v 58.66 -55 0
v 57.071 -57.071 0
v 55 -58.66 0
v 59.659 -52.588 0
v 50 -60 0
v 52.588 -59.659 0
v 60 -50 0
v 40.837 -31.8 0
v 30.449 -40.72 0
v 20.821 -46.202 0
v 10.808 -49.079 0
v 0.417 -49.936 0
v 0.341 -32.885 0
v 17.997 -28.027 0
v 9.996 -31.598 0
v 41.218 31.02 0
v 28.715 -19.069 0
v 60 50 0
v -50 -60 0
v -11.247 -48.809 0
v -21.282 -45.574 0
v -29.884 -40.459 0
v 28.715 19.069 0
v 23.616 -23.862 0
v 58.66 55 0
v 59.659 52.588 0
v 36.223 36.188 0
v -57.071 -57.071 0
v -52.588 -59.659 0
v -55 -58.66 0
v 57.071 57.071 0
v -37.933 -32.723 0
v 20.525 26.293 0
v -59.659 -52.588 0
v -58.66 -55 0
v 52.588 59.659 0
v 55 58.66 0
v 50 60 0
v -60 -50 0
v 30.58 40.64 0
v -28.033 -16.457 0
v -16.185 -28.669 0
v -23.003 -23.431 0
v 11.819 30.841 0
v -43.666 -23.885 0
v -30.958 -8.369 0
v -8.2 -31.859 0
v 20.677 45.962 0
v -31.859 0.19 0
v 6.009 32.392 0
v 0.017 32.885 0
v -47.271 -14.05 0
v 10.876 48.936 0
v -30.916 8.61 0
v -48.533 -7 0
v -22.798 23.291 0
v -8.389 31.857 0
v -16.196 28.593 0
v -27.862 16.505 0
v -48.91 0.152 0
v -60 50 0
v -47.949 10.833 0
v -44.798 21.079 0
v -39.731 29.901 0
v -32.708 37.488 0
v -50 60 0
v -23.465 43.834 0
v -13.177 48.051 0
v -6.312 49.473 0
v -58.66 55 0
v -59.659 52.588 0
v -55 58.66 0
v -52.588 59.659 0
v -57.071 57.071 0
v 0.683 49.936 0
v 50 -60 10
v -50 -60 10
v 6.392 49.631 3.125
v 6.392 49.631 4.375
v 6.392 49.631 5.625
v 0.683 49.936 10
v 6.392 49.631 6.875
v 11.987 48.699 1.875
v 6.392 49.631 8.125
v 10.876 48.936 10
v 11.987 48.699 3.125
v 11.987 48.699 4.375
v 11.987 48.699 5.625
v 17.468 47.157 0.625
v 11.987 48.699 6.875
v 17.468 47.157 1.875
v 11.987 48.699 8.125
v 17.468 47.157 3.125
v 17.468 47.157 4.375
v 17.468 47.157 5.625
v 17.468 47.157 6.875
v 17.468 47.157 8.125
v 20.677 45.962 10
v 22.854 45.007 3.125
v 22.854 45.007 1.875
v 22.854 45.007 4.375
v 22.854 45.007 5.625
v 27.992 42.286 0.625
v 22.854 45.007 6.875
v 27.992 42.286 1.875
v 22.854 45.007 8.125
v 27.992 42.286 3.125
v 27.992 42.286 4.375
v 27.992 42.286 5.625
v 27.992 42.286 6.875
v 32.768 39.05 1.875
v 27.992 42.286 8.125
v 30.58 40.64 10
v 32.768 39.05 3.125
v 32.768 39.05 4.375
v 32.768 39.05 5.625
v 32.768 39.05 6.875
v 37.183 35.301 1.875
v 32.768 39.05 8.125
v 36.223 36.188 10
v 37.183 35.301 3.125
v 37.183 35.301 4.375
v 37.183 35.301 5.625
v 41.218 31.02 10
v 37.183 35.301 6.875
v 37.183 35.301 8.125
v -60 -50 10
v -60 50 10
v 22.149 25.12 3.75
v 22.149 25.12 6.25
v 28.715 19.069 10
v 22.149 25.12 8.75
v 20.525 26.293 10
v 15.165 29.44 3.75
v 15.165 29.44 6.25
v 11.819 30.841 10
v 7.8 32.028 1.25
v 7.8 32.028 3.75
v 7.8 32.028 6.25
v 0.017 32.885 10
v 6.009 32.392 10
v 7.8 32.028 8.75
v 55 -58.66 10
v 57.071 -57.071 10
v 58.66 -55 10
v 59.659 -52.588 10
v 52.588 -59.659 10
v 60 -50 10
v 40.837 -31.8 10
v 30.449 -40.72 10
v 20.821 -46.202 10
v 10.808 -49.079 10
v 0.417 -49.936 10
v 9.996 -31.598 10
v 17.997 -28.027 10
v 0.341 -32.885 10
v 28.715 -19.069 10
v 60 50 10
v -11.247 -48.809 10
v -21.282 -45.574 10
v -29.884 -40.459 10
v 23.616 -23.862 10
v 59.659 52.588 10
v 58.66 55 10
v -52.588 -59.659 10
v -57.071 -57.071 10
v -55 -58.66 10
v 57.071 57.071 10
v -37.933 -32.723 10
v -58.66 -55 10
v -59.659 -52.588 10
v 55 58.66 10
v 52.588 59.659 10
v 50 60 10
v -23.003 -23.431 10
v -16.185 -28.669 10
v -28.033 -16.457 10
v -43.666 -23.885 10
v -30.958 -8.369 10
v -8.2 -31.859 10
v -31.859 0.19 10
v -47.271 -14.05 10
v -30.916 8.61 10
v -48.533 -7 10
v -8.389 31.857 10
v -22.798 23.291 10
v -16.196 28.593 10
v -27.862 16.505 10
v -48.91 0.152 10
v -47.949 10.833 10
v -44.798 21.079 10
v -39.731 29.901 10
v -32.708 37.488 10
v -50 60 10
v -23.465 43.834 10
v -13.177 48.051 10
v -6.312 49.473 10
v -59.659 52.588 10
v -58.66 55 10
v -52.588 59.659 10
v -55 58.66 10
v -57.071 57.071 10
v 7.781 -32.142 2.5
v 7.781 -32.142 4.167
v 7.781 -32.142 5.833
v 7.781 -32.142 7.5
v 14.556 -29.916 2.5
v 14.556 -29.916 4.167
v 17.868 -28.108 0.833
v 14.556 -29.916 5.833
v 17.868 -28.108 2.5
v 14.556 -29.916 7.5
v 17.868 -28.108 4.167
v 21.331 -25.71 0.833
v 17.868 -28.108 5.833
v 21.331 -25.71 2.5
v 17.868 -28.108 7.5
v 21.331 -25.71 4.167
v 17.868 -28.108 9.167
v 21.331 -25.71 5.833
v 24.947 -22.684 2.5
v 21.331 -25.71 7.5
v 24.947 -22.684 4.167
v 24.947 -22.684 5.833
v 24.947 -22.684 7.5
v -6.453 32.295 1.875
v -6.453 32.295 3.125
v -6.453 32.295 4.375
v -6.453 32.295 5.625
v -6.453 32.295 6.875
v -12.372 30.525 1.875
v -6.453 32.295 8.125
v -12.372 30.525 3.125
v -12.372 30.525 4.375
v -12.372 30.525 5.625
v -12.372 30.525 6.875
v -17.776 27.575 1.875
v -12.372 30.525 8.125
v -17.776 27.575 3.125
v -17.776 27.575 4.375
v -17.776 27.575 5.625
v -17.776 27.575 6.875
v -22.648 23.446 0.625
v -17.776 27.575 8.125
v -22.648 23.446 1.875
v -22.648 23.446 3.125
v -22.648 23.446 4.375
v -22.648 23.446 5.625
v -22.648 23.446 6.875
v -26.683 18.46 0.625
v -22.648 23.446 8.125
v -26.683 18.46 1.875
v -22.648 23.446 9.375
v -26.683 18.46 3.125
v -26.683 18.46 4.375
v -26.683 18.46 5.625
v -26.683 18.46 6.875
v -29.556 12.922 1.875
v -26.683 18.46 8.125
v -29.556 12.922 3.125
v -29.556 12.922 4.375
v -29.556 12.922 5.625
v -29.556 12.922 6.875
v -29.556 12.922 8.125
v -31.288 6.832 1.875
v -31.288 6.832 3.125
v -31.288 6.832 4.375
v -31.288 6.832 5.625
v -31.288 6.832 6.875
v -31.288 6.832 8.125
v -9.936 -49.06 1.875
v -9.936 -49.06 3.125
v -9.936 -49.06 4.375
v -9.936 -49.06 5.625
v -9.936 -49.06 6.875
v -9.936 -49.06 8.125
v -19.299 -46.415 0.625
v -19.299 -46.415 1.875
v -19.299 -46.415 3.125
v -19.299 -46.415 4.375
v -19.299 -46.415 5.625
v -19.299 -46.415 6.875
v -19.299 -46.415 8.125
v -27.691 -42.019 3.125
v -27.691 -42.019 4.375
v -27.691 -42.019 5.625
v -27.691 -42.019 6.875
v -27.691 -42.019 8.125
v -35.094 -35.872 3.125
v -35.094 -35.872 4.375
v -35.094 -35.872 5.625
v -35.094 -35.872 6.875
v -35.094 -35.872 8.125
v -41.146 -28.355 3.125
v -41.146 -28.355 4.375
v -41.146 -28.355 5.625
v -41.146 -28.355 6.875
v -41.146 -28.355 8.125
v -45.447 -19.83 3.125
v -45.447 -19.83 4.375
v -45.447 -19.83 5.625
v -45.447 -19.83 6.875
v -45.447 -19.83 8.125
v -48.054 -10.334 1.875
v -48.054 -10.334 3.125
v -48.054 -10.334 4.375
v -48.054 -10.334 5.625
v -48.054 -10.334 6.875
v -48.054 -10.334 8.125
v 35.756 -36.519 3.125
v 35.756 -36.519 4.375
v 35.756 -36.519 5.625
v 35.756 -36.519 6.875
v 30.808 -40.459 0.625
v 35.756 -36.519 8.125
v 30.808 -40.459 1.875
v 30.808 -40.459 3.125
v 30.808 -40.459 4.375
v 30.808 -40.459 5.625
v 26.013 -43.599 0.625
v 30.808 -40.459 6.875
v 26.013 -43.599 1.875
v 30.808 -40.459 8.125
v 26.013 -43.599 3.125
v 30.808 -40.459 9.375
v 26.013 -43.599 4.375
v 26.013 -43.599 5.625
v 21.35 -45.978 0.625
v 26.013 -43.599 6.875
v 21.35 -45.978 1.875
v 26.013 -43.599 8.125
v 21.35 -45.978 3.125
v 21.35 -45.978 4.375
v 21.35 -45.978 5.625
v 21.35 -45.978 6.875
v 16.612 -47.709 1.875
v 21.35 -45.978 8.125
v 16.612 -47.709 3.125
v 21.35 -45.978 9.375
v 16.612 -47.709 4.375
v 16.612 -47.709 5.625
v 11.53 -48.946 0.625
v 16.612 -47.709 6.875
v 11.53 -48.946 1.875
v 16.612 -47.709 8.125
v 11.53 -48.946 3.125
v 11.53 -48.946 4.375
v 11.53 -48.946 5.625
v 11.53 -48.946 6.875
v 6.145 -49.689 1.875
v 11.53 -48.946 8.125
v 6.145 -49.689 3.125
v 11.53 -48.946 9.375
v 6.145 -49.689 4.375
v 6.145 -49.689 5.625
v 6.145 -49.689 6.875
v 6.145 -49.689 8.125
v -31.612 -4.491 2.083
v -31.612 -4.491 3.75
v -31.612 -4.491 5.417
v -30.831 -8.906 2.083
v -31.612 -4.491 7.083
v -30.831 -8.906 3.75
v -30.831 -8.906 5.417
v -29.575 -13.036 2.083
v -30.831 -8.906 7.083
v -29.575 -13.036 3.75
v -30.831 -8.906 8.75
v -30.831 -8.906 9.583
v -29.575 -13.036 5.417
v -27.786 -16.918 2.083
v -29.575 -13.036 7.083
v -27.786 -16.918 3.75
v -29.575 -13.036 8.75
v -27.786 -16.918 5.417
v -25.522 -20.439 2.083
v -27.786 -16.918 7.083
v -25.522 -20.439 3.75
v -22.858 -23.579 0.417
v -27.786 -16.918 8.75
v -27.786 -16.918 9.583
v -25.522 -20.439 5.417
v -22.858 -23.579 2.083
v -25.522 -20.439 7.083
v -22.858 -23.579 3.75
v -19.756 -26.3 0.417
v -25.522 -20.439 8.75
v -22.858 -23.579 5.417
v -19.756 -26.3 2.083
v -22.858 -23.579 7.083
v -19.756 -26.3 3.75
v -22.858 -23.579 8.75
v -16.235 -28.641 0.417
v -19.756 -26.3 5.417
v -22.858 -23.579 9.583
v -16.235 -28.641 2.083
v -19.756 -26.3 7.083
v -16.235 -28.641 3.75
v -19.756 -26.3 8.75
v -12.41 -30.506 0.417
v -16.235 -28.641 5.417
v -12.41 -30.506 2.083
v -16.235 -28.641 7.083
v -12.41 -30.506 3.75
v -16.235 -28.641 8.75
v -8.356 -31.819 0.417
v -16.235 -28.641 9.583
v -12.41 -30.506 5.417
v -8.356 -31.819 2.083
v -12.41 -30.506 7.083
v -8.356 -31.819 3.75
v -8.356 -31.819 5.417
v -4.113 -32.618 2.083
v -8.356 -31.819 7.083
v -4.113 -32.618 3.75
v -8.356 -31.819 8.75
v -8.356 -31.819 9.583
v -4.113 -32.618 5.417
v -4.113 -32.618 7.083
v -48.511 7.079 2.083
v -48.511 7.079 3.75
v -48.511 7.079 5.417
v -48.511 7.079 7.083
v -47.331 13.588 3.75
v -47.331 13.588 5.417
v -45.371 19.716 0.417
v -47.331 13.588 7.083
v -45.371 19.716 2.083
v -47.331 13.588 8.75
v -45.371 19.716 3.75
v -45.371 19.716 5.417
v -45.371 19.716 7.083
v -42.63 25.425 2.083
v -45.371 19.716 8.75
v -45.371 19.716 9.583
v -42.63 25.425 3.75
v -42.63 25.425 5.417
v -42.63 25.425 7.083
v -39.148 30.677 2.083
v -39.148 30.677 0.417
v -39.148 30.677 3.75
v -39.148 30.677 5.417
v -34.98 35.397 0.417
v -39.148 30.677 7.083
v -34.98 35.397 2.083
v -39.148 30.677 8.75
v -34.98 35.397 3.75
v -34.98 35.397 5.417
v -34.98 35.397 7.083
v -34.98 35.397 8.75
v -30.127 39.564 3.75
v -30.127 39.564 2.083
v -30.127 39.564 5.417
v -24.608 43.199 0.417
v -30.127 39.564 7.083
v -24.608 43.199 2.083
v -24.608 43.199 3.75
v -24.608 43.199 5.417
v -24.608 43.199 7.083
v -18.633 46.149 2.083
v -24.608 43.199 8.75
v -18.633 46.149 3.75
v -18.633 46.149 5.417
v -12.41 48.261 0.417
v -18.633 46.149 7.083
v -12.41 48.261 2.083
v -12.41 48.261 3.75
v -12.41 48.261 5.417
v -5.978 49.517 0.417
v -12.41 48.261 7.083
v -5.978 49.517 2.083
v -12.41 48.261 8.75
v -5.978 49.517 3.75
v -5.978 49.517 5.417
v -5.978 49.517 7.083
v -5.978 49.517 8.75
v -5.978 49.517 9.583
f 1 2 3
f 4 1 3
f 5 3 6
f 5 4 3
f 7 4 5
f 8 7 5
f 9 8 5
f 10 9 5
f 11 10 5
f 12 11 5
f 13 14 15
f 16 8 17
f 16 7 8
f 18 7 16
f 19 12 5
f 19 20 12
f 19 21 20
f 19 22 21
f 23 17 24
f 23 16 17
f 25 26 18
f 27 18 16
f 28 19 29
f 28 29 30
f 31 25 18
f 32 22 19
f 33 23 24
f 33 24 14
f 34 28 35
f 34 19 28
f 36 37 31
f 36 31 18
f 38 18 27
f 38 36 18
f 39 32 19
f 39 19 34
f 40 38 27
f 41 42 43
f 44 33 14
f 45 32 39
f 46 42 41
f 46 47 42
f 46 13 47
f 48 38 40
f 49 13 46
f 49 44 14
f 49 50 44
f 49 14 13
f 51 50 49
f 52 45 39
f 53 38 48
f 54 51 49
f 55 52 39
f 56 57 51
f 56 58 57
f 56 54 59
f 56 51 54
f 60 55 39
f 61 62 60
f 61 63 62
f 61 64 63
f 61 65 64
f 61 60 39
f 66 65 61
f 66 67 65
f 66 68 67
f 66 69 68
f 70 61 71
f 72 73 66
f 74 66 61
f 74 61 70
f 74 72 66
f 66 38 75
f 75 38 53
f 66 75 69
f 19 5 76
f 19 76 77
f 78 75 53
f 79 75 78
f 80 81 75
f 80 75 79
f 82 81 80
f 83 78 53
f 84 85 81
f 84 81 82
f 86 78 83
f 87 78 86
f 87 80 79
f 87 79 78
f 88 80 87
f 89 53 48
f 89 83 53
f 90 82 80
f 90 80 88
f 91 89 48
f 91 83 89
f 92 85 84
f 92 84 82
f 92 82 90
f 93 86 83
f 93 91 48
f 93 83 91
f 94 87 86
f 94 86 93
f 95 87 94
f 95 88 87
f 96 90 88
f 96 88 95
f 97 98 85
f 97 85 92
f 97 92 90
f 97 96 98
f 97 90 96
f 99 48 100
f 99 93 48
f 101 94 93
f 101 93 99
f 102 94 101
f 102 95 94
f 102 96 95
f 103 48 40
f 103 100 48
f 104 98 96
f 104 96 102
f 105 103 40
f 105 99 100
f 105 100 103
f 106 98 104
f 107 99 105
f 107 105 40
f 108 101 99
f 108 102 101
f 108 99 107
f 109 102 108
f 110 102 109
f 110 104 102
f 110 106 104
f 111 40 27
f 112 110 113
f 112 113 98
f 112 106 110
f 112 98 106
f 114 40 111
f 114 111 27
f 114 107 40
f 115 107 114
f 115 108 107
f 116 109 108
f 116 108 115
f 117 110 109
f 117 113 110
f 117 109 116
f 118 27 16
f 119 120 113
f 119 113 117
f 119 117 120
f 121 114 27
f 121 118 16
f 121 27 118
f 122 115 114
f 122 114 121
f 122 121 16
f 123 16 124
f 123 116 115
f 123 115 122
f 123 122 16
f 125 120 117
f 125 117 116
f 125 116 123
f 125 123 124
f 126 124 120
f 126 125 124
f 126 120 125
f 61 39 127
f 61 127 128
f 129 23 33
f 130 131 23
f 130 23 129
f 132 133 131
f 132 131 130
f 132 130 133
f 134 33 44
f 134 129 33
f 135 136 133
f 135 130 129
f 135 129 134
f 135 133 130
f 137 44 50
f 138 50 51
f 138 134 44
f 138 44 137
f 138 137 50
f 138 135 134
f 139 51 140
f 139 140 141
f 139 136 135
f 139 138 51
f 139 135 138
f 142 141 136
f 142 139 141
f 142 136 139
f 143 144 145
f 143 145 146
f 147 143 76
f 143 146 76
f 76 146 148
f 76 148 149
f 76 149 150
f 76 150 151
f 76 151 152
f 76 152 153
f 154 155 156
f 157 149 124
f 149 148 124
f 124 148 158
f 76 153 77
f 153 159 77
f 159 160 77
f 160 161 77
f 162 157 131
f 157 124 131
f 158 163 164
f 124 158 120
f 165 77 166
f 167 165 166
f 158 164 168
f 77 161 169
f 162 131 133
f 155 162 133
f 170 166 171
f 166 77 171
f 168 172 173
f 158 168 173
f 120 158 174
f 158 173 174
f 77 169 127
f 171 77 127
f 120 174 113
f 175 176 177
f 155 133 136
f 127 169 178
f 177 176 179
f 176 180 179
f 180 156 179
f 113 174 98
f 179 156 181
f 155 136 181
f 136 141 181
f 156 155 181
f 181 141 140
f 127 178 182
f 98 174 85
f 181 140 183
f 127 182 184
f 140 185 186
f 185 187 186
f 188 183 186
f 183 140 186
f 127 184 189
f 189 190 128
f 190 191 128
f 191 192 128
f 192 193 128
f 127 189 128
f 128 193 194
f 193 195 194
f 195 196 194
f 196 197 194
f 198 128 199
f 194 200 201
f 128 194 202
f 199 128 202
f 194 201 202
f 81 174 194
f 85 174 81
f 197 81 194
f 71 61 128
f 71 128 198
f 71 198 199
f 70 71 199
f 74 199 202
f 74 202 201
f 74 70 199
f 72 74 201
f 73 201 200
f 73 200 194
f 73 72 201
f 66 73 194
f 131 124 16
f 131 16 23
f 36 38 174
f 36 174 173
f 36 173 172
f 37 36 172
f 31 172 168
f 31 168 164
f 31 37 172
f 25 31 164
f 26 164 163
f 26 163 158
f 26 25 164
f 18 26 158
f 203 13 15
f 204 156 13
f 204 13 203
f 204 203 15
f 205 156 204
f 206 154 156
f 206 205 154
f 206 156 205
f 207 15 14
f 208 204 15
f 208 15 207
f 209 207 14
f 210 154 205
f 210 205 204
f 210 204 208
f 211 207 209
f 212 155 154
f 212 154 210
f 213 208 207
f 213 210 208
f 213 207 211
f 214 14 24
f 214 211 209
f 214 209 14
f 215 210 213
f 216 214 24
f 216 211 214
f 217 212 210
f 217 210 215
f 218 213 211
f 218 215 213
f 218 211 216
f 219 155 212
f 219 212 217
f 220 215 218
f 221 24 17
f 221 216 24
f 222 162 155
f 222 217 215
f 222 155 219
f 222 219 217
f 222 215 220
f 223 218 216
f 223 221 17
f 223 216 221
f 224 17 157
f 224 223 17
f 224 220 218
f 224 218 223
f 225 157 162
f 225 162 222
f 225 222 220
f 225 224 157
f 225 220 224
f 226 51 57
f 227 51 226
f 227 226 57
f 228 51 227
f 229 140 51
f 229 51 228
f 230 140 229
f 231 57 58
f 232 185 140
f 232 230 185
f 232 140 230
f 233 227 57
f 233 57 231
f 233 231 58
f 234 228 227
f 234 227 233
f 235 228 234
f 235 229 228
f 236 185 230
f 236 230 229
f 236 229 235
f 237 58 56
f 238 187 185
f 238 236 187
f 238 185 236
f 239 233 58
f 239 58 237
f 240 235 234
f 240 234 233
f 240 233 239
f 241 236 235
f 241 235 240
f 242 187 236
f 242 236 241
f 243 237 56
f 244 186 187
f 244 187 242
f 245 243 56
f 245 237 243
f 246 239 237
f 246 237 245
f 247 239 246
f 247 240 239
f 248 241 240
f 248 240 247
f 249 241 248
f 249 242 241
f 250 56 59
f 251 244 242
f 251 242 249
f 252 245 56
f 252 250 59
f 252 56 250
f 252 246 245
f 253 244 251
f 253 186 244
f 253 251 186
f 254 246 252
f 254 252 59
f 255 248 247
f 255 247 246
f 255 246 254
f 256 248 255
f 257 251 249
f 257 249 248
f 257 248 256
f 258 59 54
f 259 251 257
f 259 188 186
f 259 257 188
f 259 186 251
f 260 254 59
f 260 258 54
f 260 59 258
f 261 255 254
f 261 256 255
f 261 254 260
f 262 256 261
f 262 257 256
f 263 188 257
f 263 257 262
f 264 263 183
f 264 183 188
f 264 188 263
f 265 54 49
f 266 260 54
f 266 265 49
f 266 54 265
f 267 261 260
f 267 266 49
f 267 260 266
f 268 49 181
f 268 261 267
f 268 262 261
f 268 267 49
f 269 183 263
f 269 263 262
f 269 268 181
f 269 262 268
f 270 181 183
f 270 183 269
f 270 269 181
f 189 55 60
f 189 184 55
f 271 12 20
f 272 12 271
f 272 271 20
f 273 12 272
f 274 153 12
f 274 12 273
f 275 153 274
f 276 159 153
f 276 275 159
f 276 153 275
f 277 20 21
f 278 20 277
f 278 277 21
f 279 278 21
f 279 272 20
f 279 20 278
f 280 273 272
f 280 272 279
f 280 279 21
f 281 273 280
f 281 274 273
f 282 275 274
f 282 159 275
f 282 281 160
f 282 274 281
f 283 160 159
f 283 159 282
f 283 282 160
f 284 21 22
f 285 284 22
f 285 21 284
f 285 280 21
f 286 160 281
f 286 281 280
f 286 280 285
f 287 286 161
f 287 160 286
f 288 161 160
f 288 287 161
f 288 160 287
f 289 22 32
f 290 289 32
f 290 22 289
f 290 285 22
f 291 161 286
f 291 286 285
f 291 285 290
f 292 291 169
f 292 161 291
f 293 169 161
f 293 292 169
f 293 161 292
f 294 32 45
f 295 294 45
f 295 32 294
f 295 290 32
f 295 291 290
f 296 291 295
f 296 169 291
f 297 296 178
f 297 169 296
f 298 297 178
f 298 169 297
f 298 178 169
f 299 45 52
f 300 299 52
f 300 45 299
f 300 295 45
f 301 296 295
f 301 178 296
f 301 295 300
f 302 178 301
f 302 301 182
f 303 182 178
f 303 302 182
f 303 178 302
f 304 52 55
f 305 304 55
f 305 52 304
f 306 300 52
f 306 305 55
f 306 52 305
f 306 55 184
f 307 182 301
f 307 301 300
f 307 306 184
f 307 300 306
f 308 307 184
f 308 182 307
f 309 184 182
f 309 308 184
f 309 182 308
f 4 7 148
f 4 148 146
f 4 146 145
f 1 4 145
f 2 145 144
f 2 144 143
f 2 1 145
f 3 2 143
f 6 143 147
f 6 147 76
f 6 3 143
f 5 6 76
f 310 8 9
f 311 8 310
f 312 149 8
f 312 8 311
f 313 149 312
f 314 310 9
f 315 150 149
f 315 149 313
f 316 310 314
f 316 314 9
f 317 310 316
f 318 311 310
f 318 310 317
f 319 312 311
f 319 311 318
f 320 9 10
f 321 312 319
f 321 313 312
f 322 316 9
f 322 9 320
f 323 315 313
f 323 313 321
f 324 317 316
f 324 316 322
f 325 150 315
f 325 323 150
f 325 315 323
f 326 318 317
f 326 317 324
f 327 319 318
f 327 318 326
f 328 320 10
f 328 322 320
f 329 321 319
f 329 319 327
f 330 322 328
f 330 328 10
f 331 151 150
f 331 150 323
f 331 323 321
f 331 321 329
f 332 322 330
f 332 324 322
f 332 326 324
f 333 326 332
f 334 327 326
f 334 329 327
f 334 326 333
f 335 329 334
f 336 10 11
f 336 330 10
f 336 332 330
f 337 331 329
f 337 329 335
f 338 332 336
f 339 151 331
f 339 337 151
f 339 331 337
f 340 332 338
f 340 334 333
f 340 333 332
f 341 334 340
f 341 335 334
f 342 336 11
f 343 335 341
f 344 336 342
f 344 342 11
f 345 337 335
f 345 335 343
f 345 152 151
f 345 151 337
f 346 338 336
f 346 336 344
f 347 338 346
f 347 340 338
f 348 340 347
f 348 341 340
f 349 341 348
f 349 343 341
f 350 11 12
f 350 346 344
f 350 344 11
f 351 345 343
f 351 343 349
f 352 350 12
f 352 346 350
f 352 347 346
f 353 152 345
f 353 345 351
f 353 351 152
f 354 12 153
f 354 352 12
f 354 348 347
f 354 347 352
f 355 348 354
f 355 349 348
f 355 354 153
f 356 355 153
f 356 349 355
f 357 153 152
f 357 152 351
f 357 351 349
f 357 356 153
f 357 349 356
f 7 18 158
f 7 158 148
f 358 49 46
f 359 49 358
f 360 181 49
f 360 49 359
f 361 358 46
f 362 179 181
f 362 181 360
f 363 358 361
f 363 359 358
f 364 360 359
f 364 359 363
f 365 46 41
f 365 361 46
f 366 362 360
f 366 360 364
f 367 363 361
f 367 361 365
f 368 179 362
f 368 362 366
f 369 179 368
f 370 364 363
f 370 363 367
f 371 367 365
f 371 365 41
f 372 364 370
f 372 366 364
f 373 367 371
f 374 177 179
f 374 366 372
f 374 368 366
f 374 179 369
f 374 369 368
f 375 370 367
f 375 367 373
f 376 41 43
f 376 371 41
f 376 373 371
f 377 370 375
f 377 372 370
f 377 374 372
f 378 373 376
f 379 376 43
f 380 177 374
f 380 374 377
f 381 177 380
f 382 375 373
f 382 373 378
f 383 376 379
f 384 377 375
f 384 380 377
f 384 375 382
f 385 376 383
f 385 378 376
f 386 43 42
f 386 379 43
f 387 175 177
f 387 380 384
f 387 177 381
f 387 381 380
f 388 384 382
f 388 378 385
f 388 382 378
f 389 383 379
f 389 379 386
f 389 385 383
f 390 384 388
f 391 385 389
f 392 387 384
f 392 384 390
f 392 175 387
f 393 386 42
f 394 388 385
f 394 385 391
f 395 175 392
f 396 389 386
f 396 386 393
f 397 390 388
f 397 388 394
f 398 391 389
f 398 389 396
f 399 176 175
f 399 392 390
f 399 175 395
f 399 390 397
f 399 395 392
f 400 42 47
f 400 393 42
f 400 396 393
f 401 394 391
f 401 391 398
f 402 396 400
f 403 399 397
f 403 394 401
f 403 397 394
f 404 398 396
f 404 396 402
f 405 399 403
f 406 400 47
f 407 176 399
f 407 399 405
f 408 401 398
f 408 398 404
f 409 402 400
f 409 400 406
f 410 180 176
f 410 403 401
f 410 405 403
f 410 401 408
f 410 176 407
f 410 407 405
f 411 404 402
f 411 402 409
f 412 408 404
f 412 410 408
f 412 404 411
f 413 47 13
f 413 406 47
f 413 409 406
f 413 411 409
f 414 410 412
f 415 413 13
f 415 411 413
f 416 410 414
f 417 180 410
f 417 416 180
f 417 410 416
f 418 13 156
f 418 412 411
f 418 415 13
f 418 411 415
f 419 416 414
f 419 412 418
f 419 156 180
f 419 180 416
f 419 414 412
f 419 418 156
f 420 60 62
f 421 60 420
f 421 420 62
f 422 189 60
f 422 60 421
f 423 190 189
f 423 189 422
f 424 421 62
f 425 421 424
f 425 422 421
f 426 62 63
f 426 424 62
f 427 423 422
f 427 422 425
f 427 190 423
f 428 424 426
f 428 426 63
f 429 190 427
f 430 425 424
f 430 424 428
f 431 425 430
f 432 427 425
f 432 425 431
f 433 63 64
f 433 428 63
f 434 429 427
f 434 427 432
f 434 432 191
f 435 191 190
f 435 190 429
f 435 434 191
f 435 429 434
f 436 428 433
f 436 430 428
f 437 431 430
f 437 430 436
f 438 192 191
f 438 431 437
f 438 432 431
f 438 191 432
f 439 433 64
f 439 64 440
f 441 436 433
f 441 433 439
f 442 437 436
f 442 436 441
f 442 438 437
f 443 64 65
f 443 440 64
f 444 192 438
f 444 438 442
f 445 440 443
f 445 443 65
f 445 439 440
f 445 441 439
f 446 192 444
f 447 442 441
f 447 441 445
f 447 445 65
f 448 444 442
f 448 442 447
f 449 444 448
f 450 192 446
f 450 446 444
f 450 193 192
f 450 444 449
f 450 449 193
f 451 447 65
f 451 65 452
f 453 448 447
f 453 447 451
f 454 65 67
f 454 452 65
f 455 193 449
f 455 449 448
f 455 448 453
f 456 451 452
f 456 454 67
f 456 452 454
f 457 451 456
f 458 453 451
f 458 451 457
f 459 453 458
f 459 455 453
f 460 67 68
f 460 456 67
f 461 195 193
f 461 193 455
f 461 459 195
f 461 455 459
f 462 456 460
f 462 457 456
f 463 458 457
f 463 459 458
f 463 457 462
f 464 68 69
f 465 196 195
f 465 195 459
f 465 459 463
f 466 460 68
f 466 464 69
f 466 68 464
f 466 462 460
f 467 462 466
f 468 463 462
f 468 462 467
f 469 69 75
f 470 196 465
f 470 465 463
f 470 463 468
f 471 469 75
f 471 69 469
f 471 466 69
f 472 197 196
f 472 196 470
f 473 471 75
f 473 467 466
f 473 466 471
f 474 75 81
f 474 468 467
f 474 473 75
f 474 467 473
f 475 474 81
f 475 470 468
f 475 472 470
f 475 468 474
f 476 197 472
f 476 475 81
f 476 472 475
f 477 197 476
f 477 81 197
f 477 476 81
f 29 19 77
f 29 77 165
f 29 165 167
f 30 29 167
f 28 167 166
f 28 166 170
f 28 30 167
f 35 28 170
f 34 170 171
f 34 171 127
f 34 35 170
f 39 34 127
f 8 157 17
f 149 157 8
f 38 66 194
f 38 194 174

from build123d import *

# Parameters (mm, degrees)
BOSS_EXTRUDE1_DEPTH = 10
CUT_EXTRUDE16_DEPTH = 10


with BuildPart() as part:
    # Sketch1 → Boss-Extrude1 (new body)
    with BuildSketch(Plane.XY):
        with BuildLine():
            Line((-50, 60), (50, 60))
            ThreePointArc((50, 60), (57.071067812, 57.071067812), (60, 50))
            Line((60, 50), (60, -50))
            ThreePointArc((60, -50), (57.071067812, -57.071067812), (50, -60))
            Line((50, -60), (-50, -60))
            ThreePointArc((-50, -60), (-57.071067812, -57.071067812), (-60, -50))
            Line((-60, -50), (-60, 50))
            ThreePointArc((-60, 50), (-57.071067812, 57.071067812), (-50, 60))
        make_face()
    extrude(amount=BOSS_EXTRUDE1_DEPTH)

    # Sketch2 → Cut-Extrude16 (cut)
    with BuildSketch(Plane.XY.offset(10)):
        with BuildLine():
            Line((41.217948718, 31.01963141), (28.71494391, 19.068509615))
            add(Edge.make_bspline(
                [(28.71494391, 19.068509615), (27.654337183, 20.165178749), (25.582639967, 22.307317142), (22.244356118, 25.143319595), (18.772662463, 27.506743914), (15.235093873, 29.497204828), (11.568019744, 31.00313037), (7.813841439, 32.100523678), (3.948587424, 32.7695629), (1.332732176, 32.846112827), (0.017027244, 32.884615385)],
                knots=[0, 0, 0, 0, 1.115251505, 2.178435587, 3.19620269, 4.182487026, 5.141301733, 6.088180966, 7.038406374, 8, 8, 8, 8], degree=3))
            add(Edge.make_bspline(
                [(0.017027244, 32.884615385), (-1.081746264, 32.854197018), (-3.250054721, 32.794169724), (-6.433699741, 32.354110448), (-9.479020737, 31.605770498), (-12.396442325, 30.574419427), (-15.177379867, 29.239905879), (-17.827663943, 27.603262735), (-20.340760389, 25.679271209), (-22.683472657, 23.477886123), (-24.826503507, 21.072707488), (-26.720007718, 18.506387623), (-28.30612123, 15.784805822), (-29.60781879, 12.935524265), (-30.621790871, 9.945355068), (-31.345894329, 6.816311329), (-31.764696418, 3.544666601), (-31.827205437, 1.320626893), (-31.858974359, 0.190304487)],
                knots=[0, 0, 0, 0, 1.035432265, 2.043311493, 3.022114605, 3.98653278, 4.95457646, 5.923598177, 6.917315552, 7.932509744, 8.948865224, 9.949768934, 10.933144597, 11.912367597, 12.897413939, 13.903909035, 14.934704909, 16, 16, 16, 16], degree=3))
            add(Edge.make_bspline(
                [(-31.858974359, 0.190304487), (-31.849818918, -0.603034863), (-31.831773356, -2.166723023), (-31.634232763, -4.479851798), (-31.316145828, -6.72413356), (-30.855795226, -8.896168818), (-30.280122272, -10.997839879), (-29.604726818, -13.047277753), (-28.757453155, -15.016163821), (-27.816966606, -16.927365418), (-26.723191587, -18.728733016), (-25.543900342, -20.44648652), (-24.265151526, -22.072205676), (-22.878662607, -23.599244492), (-21.364920479, -25.003738772), (-19.763049776, -26.32792333), (-18.046029154, -27.538649342), (-16.249525485, -28.66630131), (-14.358019245, -29.645902168), (-12.422831386, -30.533231294), (-10.414620559, -31.25387447), (-8.357837936, -31.834778614), (-6.259833735, -32.328750831), (-4.100087524, -32.632904706), (-1.8973216, -32.863236875), (-0.408621569, -32.87745854), (0.340544872, -32.884615385)],
                knots=[0, 0, 0, 0, 1.103660481, 2.175337485, 3.227646561, 4.255952547, 5.262355991, 6.258840057, 7.255597736, 8.242457506, 9.22035537, 10.185017736, 11.140346927, 12.096287581, 13.051739095, 14.01125915, 14.986044842, 15.97314143, 16.960198552, 17.947847494, 18.933482797, 19.925264591, 20.920966487, 21.929612487, 22.958107872, 24, 24, 24, 24], degree=3))
            add(Edge.make_bspline(
                [(0.340544872, -32.884615385), (1.611259903, -32.847859563), (4.107884503, -32.77564393), (7.772040087, -32.210927911), (11.263615319, -31.282002017), (14.053367221, -30.184994512), (16.239064148, -29.101685359), (17.903002908, -28.09967774), (19.623645272, -26.978822204), (21.372412843, -25.696816449), (23.168975786, -24.269045058), (24.981620624, -22.664237173), (26.856751385, -20.935236817), (28.08513096, -19.701215296), (28.71494391, -19.068509615)],
                knots=[0, 0, 0, 0, 1.404581149, 2.759636711, 4.088442092, 5.392261763, 6.066678138, 6.783632037, 7.538459478, 8.336747902, 9.180226004, 10.074962426, 11.012997595, 12, 12, 12, 12], degree=3))
            Line((28.71494391, -19.068509615), (40.837339744, -31.799879808))
            add(Edge.make_bspline(
                [(40.837339744, -31.799879808), (39.985200566, -32.622593431), (38.322007128, -34.228354481), (35.813125998, -36.508385331), (33.307402394, -38.557246511), (30.865369379, -40.449302703), (28.447023904, -42.129433712), (26.052622431, -43.599317508), (23.709270632, -44.896129576), (21.368308056, -45.997999818), (19.015168024, -46.933602094), (16.594063463, -47.739094243), (14.097592829, -48.420511624), (11.510508817, -48.970325958), (8.856942171, -49.411202829), (6.112059034, -49.708792168), (3.293263318, -49.908851579), (1.381230514, -49.926828575), (0.416666667, -49.935897436)],
                knots=[0, 0, 0, 0, 1.244526981, 2.429050516, 3.560637417, 4.644440555, 5.67424972, 6.652764056, 7.595344123, 8.486817594, 9.369275933, 10.254498637, 11.166417451, 12.086725134, 13.032340136, 13.991389299, 14.986715468, 16, 16, 16, 16], degree=3))
            add(Edge.make_bspline(
                [(0.416666667, -49.935897436), (-1.35511764, -49.89073112), (-4.822007032, -49.802353196), (-9.902643041, -49.147532612), (-14.729110869, -48.049737439), (-19.313152407, -46.497152269), (-23.653310037, -44.513797477), (-27.748473415, -42.082297632), (-31.592042048, -39.209112847), (-35.152967466, -35.927919636), (-38.373993978, -32.304117189), (-41.221008401, -28.413147516), (-43.576058839, -24.235887927), (-45.531507964, -19.834049889), (-47.060643461, -15.187546107), (-48.136895621, -10.291350477), (-48.800612473, -5.150190581), (-48.87322404, -1.638659859), (-48.91025641, 0.15224359)],
                knots=[0, 0, 0, 0, 1.078019885, 2.10938526, 3.111377082, 4.085535484, 5.04941344, 6.010039228, 6.978205633, 7.964457913, 8.951525778, 9.924444315, 10.892603023, 11.863865945, 12.85144698, 13.863884204, 14.910567087, 16, 16, 16, 16], degree=3))
            add(Edge.make_bspline(
                [(-48.91025641, 0.15224359), (-48.894608325, 1.320255539), (-48.863597646, 3.634969751), (-48.537672531, 7.044731317), (-48.08331397, 10.368638931), (-47.362515429, 13.572179417), (-46.493663878, 16.698510375), (-45.41313282, 19.713652236), (-44.122648013, 22.626270824), (-42.663804821, 25.441242036), (-41.013430113, 28.140124795), (-39.169780387, 30.699731445), (-37.180318376, 33.139821677), (-34.99724055, 35.428023165), (-32.652269888, 37.584426764), (-30.134819118, 39.597346508), (-27.460029448, 41.495649937), (-24.620661217, 43.230384415), (-21.671875784, 44.799543954), (-18.650865094, 46.183609685), (-15.565051419, 47.340369909), (-12.42748186, 48.299859845), (-9.224900224, 49.016051238), (-5.980165725, 49.558185018), (-2.665669568, 49.861241267), (-0.440272542, 49.910853509), (0.683092949, 49.935897436)],
                knots=[0, 0, 0, 0, 1.071919942, 2.124283339, 3.142214191, 4.149696895, 5.136002878, 6.119640489, 7.086990633, 8.058538607, 9.028339693, 9.988281803, 10.952401235, 11.916291999, 12.888973767, 13.874849856, 14.873389453, 15.898127285, 16.927174885, 17.938320013, 18.946391617, 19.950418109, 20.947802303, 21.956882652, 22.968648068, 24, 24, 24, 24], degree=3))
            add(Edge.make_bspline(
                [(0.683092949, 49.935897436), (1.641438895, 49.921541632), (3.548166658, 49.892979285), (6.387604259, 49.654881043), (9.204333367, 49.280950163), (11.988269228, 48.716768097), (14.759325397, 48.047012689), (17.481087091, 47.170060366), (20.196491572, 46.192531741), (22.862951754, 45.024095868), (25.484189625, 43.74864257), (27.998798557, 42.301594484), (30.448998604, 40.772001333), (32.780494803, 39.069335094), (35.036961098, 37.255354635), (37.206598229, 35.321596721), (39.270366363, 33.235819929), (40.565472654, 31.7620955), (41.217948718, 31.01963141)],
                knots=[0, 0, 0, 0, 0.996412454, 1.982464992, 2.961075852, 3.949442424, 4.934965278, 5.923860011, 6.921385422, 7.934793307, 8.949617135, 9.951082467, 10.950285876, 11.951772932, 12.951063433, 13.960125323, 14.972308753, 16, 16, 16, 16], degree=3))
        make_face()
    extrude(amount=-CUT_EXTRUDE16_DEPTH, mode=Mode.SUBTRACT)


solid = part.part
